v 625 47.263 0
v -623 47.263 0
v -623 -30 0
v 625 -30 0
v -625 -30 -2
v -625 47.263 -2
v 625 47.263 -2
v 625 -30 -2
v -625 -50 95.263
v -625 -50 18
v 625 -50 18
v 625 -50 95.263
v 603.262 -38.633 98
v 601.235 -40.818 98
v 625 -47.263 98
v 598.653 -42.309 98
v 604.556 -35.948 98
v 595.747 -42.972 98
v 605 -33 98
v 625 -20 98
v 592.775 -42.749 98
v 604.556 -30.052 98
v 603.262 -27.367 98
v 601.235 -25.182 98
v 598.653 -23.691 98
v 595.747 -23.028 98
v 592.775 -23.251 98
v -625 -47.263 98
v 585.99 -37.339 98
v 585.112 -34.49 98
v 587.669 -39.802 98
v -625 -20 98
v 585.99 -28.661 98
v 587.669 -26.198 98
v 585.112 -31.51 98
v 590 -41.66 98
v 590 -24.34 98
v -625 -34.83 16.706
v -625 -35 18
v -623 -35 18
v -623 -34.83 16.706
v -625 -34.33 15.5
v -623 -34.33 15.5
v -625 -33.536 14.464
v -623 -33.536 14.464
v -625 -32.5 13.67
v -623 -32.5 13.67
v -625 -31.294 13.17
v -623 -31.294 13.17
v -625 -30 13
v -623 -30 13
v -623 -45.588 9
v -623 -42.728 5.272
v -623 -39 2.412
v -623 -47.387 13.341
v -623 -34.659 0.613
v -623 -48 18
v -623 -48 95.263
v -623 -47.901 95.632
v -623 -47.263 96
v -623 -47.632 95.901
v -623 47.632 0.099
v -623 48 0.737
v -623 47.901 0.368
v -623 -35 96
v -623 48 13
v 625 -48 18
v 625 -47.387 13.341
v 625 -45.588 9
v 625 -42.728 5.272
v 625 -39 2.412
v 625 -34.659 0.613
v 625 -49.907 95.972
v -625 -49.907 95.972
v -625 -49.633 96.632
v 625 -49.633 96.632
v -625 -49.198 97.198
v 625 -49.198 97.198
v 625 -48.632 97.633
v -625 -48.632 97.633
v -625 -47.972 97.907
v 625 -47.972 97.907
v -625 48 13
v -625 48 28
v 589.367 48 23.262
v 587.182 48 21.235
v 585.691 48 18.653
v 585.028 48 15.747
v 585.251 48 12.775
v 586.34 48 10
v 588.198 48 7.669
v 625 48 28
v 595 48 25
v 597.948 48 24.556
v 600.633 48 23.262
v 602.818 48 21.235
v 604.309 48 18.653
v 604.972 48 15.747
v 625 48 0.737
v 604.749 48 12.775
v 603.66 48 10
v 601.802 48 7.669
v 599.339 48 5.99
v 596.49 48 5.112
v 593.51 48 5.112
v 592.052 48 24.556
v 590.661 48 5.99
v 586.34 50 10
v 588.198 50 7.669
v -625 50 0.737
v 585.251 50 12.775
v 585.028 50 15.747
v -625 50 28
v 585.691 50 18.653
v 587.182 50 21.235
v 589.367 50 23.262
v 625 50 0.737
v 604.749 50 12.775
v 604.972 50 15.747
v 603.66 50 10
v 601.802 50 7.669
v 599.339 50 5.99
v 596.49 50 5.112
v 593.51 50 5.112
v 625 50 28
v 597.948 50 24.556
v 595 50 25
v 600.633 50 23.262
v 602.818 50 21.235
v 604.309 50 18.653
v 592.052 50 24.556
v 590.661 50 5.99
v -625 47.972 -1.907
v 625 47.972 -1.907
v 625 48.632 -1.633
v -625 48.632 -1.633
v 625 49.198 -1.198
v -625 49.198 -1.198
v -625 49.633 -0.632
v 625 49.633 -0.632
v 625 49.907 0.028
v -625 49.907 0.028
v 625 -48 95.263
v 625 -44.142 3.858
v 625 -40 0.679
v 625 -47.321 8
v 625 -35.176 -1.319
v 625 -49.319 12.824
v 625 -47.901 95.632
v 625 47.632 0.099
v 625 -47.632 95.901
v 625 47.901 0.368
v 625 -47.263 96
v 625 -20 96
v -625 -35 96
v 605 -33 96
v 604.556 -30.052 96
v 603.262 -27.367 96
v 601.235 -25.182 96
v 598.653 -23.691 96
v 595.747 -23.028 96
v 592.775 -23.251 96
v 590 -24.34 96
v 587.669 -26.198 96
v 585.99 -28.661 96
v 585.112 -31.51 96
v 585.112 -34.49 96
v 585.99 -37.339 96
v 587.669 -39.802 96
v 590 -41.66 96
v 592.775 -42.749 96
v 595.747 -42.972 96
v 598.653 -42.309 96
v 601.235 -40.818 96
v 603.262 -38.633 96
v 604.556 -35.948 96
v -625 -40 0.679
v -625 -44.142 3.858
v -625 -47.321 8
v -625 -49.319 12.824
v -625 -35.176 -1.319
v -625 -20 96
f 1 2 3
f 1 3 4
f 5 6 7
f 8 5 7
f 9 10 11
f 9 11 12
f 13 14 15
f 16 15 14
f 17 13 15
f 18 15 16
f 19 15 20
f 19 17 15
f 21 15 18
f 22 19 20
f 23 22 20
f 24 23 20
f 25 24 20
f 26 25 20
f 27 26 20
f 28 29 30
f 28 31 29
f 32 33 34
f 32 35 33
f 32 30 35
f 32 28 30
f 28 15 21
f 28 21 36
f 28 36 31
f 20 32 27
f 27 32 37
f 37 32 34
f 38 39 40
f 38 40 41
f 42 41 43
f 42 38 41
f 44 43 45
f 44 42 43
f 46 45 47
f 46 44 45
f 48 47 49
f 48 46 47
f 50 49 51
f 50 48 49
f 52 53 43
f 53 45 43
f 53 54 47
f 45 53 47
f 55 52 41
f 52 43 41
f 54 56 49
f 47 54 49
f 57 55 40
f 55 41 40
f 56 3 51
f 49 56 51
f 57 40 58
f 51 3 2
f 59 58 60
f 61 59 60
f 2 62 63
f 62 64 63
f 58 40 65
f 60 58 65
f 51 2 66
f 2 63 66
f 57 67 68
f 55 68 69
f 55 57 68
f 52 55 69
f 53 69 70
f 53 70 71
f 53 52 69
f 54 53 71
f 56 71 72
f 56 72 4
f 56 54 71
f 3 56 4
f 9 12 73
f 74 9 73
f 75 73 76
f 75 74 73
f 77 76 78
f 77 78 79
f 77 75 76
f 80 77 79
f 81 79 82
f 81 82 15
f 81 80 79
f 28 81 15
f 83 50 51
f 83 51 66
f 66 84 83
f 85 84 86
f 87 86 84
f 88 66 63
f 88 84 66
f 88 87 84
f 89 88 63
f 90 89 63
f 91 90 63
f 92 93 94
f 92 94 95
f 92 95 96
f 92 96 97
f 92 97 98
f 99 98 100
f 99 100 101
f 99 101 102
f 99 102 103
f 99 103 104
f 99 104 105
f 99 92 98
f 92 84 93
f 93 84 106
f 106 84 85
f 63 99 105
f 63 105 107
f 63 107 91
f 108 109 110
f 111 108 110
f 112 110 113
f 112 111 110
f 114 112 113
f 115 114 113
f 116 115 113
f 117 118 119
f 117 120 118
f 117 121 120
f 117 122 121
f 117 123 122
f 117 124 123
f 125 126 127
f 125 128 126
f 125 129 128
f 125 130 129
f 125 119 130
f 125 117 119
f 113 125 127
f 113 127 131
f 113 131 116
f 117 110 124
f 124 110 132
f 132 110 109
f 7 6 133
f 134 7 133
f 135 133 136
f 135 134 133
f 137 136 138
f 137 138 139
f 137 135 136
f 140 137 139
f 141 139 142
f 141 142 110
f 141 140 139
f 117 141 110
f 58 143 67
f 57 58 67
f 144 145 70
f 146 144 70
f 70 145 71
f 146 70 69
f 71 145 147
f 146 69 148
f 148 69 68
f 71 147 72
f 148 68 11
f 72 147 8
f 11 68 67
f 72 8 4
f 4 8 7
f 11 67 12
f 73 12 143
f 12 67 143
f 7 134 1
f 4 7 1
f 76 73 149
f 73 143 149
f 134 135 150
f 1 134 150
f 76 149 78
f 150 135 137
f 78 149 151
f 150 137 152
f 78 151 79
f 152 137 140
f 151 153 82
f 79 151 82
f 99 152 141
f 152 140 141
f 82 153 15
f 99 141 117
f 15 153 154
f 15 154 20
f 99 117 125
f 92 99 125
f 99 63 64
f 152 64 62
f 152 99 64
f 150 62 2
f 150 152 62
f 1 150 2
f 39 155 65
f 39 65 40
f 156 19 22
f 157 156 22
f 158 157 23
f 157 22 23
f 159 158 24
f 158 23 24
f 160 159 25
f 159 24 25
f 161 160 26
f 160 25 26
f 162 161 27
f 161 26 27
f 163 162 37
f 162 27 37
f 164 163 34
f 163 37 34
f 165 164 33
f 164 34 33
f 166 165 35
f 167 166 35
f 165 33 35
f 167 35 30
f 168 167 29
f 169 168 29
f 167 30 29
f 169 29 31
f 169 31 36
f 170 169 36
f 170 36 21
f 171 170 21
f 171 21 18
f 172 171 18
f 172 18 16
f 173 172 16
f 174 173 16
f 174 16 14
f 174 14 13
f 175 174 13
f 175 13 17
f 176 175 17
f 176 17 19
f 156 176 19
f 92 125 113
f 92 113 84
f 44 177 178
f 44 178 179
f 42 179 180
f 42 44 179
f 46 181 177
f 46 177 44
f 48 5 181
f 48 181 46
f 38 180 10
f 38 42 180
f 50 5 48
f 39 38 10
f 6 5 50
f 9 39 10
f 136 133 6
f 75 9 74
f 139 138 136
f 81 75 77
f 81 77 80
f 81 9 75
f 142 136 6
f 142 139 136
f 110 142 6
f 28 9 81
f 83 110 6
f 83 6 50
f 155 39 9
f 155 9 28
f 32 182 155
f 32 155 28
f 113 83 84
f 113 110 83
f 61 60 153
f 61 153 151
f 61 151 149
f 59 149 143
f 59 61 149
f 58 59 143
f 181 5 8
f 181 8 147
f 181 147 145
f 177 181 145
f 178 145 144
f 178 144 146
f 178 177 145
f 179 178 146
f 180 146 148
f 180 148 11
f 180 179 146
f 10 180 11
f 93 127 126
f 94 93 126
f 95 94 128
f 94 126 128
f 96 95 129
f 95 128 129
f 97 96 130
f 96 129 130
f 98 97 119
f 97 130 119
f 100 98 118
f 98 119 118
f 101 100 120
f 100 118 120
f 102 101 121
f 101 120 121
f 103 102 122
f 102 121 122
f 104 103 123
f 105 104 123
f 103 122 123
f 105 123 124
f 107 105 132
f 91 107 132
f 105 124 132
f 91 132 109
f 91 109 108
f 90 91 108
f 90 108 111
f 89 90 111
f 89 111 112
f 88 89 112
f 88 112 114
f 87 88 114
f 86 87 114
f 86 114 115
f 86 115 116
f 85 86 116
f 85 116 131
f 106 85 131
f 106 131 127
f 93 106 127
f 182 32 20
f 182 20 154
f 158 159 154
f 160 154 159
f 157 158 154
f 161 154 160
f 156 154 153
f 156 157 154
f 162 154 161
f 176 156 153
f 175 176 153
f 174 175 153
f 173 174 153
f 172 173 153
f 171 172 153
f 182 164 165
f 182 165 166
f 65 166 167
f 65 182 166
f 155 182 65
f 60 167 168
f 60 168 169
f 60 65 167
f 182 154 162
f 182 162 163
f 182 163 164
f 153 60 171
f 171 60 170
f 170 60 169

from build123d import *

# Parameters (mm, degrees)
SKETCH_2_W                       = 1250
SKETCH_2_H                       = 100
SM_BASE_FLANGE_1_DEPTH           = 2
SM_EDGE_FLANGE_1_STRIP_W         = 44
SM_EDGE_FLANGE_1_STRIP_H         = 2
SM_EDGE_FLANGE_1_STRIP_CUT_DEPTH = 1250
SM_EDGE_FLANGE_1_DEPTH           = 1250
SM_EDGE_FLANGE_2_STRIP_W         = 9.4732
SM_EDGE_FLANGE_2_STRIP_H         = 2
SM_EDGE_FLANGE_2_STRIP_CUT_DEPTH = 1250
SM_EDGE_FLANGE_2_DEPTH           = 1250
SM_EDGE_FLANGE_3_STRIP_W         = 9.4732
SM_EDGE_FLANGE_3_STRIP_H         = 2
SM_EDGE_FLANGE_3_STRIP_CUT_DEPTH = 1250
SM_EDGE_FLANGE_3_DEPTH           = 1250
SKETCH_16_R                      = 10
CUT_EXTRUDE_1_DEPTH              = 10
SKETCH_17_R                      = 10
CUT_EXTRUDE_2_DEPTH              = 10
EXTRUDE_1_DEPTH                  = 2


# Sheet-metal steps are written as plain solids
with BuildPart() as part:
    # Sketch 2 → 基体-法兰1 (new body)
    with BuildSketch(Plane.XY):
        Rectangle(SKETCH_2_W, SKETCH_2_H)
    extrude(amount=-SM_BASE_FLANGE_1_DEPTH)

    # 边线-法兰1 strip (across the edge) → 边线-法兰1 strip cut (cut)
    with BuildSketch(Plane(origin=(-625, -50, 0), x_dir=(0, 1, 0), z_dir=(1, 0, 0))):
        with Locations((-2, -1)):
            Rectangle(SM_EDGE_FLANGE_1_STRIP_W, SM_EDGE_FLANGE_1_STRIP_H)
    extrude(amount=SM_EDGE_FLANGE_1_STRIP_CUT_DEPTH, mode=Mode.SUBTRACT)

    # 边线-法兰1 section (across the edge) → 边线-法兰1 (add)
    with BuildSketch(Plane(origin=(-625, -50, 0), x_dir=(0, 1, 0), z_dir=(1, 0, 0))):
        with BuildLine():
            Line((0, 18), (0, 98))
            Line((0, 98), (2, 98))
            Line((2, 98), (2, 18))
            ThreePointArc((2, 18), (7.272077939, 5.272077939), (20, 0))
            Line((20, 0), (20, -2))
            ThreePointArc((20, -2), (5.857864376, 3.857864376), (0, 18))
        make_face()
    extrude(amount=SM_EDGE_FLANGE_1_DEPTH)

    # 边线-法兰2 strip (across the edge) → 边线-法兰2 strip cut (cut)
    with BuildSketch(Plane(origin=(625, 50, 0), x_dir=(0, -1, 0), z_dir=(-1, 0, 0))):
        with Locations((-2, -1)):
            Rectangle(SM_EDGE_FLANGE_2_STRIP_W, SM_EDGE_FLANGE_2_STRIP_H)
    extrude(amount=SM_EDGE_FLANGE_2_STRIP_CUT_DEPTH, mode=Mode.SUBTRACT)

    # 边线-法兰2 section (across the edge) → 边线-法兰2 (add)
    with BuildSketch(Plane(origin=(625, 50, 0), x_dir=(0, -1, 0), z_dir=(-1, 0, 0))):
        with BuildLine():
            Line((0, 0.7366), (0, 28))
            Line((0, 28), (2, 28))
            Line((2, 28), (2, 0.7366))
            ThreePointArc((2, 0.7366), (2.215745145, 0.215745145), (2.7366, 0))
            Line((2.7366, 0), (2.7366, -2))
            ThreePointArc((2.7366, -2), (0.801531583, -1.198468417), (0, 0.7366))
        make_face()
    extrude(amount=SM_EDGE_FLANGE_2_DEPTH)

    # 边线-法兰3 strip (across the edge) → 边线-法兰3 strip cut (cut)
    with BuildSketch(Plane(origin=(-625, -48, 98), x_dir=(0, 0, -1), z_dir=(1, 0, 0))):
        with Locations((-2, -1)):
            Rectangle(SM_EDGE_FLANGE_3_STRIP_W, SM_EDGE_FLANGE_3_STRIP_H)
    extrude(amount=SM_EDGE_FLANGE_3_STRIP_CUT_DEPTH, mode=Mode.SUBTRACT)

    # 边线-法兰3 section (across the edge) → 边线-法兰3 (add)
    with BuildSketch(Plane(origin=(-625, -48, 98), x_dir=(0, 0, -1), z_dir=(1, 0, 0))):
        with BuildLine():
            Line((0, 0.7366), (0, 28))
            Line((0, 28), (2, 28))
            Line((2, 28), (2, 0.7366))
            ThreePointArc((2, 0.7366), (2.215745145, 0.215745145), (2.7366, 0))
            Line((2.7366, 0), (2.7366, -2))
            ThreePointArc((2.7366, -2), (0.801531583, -1.198468417), (0, 0.7366))
        make_face()
    extrude(amount=SM_EDGE_FLANGE_3_DEPTH)

    # 草图16 → 切除-拉伸1 (cut)
    with BuildSketch(Plane(origin=(0, 50, 0), x_dir=(1, 0, 0), z_dir=(0, 1, 0))):
        with Locations(Location((595, -15, 0), (0, 0, 270))):
            Circle(SKETCH_16_R)
    extrude(amount=-CUT_EXTRUDE_1_DEPTH, mode=Mode.SUBTRACT)

    # 草图17 → 切除-拉伸2 (cut)
    with BuildSketch(Plane.XY.offset(98)):
        with Locations((595, -33)):
            Circle(SKETCH_17_R)
    extrude(amount=-CUT_EXTRUDE_2_DEPTH, mode=Mode.SUBTRACT)

    # 草图30 → 凸台-拉伸1 (add)
    with BuildSketch(Plane.ZY.offset(625)):
        with BuildLine():
            Line((13, 50), (0.7366, 50))
            ThreePointArc((0.7366, 50), (-1.198468417, 49.198468417), (-2, 47.2634))
            Line((-2, 47.2634), (-2, -30))
            ThreePointArc((-2, -30), (3.857864376, -44.142135624), (18, -50))
            Line((18, -50), (95.2634, -50))
            ThreePointArc((95.2634, -50), (97.198468417, -49.198468417), (98, -47.2634))
            Line((98, -47.2634), (98, -35))
            Line((98, -35), (18, -35))
            ThreePointArc((18, -35), (14.464466094, -33.535533906), (13, -30))
            Line((13, -30), (13, 50))
        make_face()
    extrude(amount=-EXTRUDE_1_DEPTH)


solid = part.part
